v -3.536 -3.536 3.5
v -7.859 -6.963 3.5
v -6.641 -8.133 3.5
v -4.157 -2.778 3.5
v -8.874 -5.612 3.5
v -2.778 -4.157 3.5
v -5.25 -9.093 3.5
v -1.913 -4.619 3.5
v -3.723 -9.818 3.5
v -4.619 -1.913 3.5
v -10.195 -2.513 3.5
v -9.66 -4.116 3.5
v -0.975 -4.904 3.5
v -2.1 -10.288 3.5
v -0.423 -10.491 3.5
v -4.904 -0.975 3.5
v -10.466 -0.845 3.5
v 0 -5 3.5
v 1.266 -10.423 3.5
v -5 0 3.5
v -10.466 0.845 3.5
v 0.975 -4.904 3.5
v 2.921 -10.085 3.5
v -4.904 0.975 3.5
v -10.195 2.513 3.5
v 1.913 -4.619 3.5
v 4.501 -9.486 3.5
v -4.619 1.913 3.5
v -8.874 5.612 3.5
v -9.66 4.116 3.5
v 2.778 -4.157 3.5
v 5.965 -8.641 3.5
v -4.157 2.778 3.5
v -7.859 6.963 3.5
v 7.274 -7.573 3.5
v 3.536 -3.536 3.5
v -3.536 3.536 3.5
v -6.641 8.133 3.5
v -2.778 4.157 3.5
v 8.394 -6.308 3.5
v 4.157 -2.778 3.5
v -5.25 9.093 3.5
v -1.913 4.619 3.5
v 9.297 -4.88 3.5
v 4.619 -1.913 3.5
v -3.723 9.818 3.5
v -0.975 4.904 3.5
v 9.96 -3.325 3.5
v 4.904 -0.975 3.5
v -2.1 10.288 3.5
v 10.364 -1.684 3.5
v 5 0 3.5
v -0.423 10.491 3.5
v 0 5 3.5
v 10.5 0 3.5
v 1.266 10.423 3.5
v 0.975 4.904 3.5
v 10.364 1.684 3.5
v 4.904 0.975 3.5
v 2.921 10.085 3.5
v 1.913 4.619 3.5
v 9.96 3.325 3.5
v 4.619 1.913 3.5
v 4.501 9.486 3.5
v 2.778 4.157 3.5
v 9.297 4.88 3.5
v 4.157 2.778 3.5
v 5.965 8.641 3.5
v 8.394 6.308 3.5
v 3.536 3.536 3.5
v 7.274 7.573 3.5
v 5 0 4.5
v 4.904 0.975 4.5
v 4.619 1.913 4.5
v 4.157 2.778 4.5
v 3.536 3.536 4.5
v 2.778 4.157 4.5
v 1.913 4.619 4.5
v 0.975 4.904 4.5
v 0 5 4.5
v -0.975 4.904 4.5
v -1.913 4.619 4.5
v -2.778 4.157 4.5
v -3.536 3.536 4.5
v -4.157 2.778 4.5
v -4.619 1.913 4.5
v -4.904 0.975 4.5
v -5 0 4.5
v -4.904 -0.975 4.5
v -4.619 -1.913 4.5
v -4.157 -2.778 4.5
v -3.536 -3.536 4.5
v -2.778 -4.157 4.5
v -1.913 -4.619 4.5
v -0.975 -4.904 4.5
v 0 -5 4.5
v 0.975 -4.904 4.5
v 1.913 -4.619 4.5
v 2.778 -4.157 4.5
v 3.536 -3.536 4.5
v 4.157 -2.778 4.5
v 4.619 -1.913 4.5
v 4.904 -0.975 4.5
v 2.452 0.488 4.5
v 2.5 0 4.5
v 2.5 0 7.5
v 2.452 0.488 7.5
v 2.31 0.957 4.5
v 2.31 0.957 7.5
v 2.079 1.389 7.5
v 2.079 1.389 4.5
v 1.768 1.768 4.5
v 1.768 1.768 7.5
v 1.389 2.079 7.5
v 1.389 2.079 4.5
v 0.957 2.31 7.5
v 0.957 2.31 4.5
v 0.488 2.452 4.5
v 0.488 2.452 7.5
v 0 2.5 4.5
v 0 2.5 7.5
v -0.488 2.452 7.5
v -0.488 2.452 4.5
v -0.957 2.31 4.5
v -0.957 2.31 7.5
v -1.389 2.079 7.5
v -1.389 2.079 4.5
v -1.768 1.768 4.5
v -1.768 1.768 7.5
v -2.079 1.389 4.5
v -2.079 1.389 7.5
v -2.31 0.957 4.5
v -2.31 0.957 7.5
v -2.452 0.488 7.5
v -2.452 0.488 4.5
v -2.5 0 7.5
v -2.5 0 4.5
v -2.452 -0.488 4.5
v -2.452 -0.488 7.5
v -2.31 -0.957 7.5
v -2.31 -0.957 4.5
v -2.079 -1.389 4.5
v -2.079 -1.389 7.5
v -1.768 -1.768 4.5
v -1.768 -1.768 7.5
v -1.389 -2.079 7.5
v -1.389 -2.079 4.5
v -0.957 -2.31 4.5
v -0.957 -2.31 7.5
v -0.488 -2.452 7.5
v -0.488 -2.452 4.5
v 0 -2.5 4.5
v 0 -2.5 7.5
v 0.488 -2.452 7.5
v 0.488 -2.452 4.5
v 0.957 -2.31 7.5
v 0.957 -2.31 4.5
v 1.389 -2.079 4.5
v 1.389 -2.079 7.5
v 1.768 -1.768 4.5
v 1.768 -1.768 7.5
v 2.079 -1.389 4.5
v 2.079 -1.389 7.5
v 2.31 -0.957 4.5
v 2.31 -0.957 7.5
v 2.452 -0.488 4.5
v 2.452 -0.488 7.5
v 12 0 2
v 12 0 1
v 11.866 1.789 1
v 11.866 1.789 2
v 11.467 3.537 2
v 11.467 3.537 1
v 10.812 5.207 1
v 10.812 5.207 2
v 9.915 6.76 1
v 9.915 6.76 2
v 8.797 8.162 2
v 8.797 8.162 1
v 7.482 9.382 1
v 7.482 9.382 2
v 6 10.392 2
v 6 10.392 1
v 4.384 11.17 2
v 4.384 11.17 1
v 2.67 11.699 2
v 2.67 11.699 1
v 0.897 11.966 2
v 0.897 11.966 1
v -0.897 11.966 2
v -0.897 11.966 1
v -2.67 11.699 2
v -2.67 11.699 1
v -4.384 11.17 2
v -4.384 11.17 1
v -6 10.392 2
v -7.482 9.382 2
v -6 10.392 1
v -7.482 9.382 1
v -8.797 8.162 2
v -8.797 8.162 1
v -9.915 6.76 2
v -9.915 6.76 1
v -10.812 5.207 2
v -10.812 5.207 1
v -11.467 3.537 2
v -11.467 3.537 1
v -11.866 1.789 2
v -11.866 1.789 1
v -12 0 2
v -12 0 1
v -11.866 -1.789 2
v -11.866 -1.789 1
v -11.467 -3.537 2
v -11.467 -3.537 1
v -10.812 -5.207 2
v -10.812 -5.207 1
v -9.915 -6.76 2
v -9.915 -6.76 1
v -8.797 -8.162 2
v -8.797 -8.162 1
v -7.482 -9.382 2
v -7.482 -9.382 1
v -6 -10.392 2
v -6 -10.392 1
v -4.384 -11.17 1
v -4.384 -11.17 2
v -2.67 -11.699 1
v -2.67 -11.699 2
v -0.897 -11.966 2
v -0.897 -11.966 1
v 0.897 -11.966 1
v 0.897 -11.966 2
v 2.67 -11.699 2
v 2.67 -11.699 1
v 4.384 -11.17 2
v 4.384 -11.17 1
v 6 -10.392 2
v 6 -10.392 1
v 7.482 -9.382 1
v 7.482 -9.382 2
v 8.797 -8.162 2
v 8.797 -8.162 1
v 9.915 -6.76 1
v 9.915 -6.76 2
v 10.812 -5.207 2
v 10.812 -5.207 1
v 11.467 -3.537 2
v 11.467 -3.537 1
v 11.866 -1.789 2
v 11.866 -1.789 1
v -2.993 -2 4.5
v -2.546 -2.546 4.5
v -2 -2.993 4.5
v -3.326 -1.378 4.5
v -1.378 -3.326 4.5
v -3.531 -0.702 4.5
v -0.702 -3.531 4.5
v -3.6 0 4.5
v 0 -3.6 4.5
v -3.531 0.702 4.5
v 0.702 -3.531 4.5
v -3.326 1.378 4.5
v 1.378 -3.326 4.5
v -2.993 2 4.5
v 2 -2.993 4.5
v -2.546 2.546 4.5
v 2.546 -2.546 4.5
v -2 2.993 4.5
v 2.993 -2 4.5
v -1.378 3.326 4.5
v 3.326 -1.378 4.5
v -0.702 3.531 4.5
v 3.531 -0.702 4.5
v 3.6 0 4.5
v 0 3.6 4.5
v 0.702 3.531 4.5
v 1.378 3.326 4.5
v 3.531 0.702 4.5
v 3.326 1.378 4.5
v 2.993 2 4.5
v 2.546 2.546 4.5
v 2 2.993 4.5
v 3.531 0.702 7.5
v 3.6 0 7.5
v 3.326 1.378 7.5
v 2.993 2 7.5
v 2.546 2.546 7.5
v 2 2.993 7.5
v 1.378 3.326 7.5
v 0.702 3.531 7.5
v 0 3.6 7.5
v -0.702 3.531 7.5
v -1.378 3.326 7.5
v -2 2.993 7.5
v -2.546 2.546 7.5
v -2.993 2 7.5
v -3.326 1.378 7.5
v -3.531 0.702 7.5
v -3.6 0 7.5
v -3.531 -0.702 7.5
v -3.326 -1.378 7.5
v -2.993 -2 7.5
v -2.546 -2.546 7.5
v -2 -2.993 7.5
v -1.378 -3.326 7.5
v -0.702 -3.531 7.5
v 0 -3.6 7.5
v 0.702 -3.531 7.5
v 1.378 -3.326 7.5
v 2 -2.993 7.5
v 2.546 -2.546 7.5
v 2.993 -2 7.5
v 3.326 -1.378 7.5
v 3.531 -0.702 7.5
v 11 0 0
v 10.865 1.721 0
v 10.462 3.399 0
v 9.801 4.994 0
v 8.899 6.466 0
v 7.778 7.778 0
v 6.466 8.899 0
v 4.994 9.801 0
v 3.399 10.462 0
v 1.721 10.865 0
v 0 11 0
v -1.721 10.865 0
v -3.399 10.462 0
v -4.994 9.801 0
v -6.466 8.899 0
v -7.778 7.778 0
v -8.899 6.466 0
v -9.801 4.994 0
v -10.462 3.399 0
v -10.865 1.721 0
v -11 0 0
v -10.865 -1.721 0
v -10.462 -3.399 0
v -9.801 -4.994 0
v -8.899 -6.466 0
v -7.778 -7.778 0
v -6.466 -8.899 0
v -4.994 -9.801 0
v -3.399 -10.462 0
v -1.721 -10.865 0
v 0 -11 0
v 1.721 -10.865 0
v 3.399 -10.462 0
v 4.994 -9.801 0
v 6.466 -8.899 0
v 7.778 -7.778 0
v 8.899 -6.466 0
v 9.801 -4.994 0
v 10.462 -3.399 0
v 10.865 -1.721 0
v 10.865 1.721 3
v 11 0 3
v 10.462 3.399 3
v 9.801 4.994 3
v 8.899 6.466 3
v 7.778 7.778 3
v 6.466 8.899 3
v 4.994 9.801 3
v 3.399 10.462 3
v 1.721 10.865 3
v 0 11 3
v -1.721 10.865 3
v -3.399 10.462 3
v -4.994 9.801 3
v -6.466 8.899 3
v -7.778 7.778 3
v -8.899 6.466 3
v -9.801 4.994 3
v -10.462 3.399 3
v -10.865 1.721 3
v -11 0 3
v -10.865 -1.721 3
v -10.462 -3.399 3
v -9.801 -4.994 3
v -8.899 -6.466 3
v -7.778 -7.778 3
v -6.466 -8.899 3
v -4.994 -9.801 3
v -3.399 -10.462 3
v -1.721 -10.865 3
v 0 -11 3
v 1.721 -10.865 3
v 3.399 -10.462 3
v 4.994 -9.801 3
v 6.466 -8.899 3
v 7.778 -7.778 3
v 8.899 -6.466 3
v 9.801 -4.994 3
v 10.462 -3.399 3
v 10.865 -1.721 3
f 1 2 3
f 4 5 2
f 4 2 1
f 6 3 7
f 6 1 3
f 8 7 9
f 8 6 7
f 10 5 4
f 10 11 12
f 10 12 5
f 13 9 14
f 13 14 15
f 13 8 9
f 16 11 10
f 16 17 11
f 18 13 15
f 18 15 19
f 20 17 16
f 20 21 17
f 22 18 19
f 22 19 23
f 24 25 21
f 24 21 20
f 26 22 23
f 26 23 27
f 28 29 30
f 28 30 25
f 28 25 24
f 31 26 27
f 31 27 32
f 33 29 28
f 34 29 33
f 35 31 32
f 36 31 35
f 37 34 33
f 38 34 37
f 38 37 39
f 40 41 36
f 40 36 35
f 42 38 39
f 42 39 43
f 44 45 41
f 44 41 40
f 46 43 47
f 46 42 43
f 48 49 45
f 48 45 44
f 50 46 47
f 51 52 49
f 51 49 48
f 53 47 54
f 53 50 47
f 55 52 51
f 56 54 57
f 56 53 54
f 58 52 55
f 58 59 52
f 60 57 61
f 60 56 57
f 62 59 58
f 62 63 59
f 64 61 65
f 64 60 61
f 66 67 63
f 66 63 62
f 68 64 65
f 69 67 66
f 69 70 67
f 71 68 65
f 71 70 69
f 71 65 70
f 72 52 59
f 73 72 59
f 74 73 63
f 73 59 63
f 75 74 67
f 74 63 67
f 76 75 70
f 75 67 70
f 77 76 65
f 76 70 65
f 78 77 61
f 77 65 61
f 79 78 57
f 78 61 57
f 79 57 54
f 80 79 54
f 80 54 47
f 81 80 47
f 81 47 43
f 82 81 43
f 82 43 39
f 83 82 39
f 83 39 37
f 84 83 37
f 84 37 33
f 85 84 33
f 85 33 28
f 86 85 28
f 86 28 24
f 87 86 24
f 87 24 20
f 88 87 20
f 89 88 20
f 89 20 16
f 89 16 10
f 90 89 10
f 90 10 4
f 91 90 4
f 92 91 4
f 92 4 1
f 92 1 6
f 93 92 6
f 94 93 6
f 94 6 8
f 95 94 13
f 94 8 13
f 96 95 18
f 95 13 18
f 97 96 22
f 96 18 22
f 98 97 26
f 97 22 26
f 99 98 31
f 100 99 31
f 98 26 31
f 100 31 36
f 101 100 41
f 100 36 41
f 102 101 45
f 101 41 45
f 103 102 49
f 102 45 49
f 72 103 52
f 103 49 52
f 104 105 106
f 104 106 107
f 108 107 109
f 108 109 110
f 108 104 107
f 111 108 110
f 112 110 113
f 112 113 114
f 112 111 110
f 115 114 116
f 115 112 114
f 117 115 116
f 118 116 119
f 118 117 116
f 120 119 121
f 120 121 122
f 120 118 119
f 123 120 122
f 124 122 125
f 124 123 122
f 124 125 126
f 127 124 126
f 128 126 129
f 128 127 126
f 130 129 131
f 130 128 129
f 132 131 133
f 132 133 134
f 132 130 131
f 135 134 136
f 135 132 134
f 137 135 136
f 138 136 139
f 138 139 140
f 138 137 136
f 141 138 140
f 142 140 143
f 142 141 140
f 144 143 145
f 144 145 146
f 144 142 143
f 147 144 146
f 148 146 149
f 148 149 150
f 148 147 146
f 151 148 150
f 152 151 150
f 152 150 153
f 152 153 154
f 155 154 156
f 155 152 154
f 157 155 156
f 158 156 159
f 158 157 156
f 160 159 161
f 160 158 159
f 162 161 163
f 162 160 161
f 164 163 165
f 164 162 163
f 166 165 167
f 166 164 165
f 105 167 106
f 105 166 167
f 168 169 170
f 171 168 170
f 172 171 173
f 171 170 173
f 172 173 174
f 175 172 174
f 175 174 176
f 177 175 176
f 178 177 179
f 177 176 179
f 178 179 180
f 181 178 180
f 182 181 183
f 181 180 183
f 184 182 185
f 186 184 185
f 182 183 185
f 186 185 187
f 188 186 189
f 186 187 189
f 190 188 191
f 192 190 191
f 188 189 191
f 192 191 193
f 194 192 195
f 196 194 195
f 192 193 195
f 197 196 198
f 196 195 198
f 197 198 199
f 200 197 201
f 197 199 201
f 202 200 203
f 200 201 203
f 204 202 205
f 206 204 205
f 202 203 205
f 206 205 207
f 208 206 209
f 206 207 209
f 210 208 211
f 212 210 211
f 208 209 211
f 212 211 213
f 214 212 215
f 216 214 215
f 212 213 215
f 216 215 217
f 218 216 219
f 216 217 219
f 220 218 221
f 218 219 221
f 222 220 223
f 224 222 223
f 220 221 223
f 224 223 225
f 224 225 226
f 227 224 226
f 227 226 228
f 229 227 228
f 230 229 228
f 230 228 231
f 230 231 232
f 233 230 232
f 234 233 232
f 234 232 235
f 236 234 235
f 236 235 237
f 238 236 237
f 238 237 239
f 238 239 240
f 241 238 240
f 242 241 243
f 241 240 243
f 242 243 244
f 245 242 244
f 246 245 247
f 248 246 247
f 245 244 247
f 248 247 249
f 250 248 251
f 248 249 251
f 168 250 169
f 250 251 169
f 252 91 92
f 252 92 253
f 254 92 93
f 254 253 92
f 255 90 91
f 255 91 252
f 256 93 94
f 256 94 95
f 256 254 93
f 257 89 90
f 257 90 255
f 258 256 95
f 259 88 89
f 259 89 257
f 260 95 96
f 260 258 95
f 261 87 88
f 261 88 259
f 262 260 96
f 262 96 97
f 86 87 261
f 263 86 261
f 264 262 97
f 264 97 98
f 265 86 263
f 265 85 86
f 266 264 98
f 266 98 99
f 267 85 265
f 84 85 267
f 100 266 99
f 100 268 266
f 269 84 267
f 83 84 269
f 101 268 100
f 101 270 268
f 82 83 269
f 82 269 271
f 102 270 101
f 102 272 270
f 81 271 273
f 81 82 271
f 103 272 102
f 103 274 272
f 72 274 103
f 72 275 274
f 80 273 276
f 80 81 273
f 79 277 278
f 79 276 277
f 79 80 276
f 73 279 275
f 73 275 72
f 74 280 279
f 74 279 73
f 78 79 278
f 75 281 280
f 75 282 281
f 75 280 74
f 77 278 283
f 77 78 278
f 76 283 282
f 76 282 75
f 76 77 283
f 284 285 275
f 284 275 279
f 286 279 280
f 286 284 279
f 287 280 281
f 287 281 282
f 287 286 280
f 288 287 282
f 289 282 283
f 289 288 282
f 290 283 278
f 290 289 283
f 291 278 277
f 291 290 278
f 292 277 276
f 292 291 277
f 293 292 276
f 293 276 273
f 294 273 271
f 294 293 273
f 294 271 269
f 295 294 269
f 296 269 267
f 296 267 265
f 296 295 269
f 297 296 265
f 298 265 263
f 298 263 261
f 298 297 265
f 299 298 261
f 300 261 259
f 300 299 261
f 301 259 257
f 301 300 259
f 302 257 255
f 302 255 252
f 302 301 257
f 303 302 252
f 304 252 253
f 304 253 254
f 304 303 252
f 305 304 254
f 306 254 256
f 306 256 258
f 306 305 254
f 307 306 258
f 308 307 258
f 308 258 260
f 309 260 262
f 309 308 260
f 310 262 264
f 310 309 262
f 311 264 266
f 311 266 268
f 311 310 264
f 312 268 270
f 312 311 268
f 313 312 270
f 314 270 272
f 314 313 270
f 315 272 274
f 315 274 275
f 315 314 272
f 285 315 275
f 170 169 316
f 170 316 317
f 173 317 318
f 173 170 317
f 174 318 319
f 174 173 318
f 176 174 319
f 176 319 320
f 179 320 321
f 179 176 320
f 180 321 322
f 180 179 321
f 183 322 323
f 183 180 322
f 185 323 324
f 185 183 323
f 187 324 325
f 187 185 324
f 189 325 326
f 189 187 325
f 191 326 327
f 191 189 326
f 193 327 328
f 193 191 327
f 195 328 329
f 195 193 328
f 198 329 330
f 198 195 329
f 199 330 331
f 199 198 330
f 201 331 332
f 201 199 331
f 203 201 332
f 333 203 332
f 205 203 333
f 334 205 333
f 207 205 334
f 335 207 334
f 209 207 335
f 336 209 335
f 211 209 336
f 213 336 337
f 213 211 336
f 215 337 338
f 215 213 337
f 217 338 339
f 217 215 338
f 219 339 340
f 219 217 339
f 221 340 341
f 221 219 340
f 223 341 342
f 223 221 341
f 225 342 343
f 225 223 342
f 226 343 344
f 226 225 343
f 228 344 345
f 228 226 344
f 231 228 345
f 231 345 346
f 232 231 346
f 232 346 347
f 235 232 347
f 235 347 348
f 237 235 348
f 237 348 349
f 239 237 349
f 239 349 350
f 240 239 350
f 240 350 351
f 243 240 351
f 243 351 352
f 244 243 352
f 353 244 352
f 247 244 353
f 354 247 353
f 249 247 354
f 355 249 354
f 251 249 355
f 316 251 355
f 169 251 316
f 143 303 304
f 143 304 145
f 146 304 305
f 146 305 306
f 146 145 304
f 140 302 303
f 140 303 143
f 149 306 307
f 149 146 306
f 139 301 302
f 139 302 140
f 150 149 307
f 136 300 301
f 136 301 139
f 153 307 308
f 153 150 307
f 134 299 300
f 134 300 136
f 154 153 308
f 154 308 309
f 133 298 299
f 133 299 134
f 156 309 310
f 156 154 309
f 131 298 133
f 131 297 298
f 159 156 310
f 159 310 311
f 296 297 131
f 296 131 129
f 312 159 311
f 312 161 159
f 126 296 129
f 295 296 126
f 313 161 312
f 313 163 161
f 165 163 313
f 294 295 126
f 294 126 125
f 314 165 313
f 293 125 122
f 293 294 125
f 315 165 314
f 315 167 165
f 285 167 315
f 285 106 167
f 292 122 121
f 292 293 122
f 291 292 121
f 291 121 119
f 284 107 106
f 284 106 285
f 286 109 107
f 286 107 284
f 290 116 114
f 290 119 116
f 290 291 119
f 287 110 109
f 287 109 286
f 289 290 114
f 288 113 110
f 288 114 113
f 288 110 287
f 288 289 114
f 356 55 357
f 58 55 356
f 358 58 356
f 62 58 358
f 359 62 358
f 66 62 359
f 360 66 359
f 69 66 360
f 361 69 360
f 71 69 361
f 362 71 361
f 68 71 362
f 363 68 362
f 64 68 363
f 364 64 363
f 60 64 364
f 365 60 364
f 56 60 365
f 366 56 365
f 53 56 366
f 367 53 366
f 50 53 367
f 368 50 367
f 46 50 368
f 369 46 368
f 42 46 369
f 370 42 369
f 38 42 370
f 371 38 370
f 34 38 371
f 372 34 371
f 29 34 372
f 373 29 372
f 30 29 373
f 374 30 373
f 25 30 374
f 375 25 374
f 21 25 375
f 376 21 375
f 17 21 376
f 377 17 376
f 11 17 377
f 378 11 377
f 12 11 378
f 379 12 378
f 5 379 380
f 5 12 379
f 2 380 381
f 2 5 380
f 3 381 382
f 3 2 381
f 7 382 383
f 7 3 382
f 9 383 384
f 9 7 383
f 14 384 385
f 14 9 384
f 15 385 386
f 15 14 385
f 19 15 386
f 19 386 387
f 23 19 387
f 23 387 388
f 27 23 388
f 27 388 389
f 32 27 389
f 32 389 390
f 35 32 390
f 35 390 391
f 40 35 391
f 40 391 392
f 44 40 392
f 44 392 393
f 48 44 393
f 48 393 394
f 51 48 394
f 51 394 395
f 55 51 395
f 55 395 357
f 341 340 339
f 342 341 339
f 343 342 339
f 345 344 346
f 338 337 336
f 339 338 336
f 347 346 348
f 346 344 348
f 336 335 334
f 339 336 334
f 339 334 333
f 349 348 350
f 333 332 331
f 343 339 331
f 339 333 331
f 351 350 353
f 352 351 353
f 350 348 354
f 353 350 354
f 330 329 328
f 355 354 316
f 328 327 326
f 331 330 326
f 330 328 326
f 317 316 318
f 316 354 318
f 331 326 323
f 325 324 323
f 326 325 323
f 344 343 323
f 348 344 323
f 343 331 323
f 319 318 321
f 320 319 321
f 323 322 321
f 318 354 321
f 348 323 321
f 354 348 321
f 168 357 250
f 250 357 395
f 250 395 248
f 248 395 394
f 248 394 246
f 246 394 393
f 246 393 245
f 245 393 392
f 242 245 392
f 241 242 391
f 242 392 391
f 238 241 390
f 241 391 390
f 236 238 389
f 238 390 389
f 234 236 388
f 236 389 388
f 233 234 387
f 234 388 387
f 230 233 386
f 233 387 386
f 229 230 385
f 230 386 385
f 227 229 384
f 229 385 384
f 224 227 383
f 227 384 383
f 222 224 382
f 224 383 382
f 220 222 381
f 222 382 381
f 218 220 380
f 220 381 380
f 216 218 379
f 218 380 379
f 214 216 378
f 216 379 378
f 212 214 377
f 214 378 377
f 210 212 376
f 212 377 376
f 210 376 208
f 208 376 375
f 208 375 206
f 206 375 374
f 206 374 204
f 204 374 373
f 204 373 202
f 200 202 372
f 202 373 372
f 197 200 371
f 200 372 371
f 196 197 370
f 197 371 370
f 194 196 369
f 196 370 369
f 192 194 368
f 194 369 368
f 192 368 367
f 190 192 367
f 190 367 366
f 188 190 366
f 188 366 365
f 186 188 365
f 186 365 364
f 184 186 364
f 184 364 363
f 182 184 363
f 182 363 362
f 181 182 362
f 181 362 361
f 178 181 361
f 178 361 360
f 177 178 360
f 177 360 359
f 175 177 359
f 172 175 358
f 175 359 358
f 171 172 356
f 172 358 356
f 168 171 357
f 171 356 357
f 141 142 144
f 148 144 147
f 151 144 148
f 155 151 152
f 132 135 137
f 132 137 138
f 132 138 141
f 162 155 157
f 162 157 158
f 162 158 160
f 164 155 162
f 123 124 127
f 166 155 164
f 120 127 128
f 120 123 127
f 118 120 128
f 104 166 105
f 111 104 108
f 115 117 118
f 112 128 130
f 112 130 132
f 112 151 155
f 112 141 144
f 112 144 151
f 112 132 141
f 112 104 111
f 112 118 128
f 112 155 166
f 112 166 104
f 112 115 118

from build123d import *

# Parameters (mm, degrees)
F0_R      = 12
F0_R_2    = 11
F0_R_3    = 5
F0_R_4    = 4.1
F0_R_5    = 3
F1_DEPTH  = 2
F2_DEPTH  = 3.5
F3_SIZE   = 0.99999
F4_DEPTH  = 4.5
F5_DEPTH  = 7.5
F6_SIZE   = 1
F7_SIZE   = 0.5
F8_R      = 3
F8_R_2    = 2.5
F9_DEPTH  = 3
F10_R     = 4.1
F10_R_2   = 3.6
F11_DEPTH = 3


# Not quite as in the source:
# - a fillet or chamfer is up to 0.001 mm smaller than in the source, because OpenCascade refuses the exact size


with BuildPart() as f1:
    # F0 (on Top) → F1 (new body)
    with BuildSketch(Plane.XY):
        Circle(F0_R)
        Circle(F0_R_2, mode=Mode.SUBTRACT)
        Circle(F0_R_2)
        Circle(F0_R_3, mode=Mode.SUBTRACT)
        Circle(F0_R_3)
        Circle(F0_R_4, mode=Mode.SUBTRACT)
        Circle(F0_R_4)
        Circle(F0_R_5, mode=Mode.SUBTRACT)
        Circle(F0_R_5)
    extrude(amount=F1_DEPTH)

    # F0 (on Top) → F2 (join)
    with BuildSketch(Plane.XY):
        Circle(F0_R_2)
        Circle(F0_R_3, mode=Mode.SUBTRACT)
        Circle(F0_R_3)
        Circle(F0_R_4, mode=Mode.SUBTRACT)
        Circle(F0_R_4)
        Circle(F0_R_5, mode=Mode.SUBTRACT)
        Circle(F0_R_5)
    extrude(amount=F2_DEPTH)

    # F3 (size 1 in the source; OpenCascade refuses exactly that, so slightly less here)
    f3_edges = [f1.edges().sort_by_distance(p)[0] for p in [
        (-11, 0, 2),
    ]]
    chamfer(f3_edges, length=F3_SIZE)

    # F0 (on Top) → F4 (join)
    with BuildSketch(Plane.XY):
        Circle(F0_R_3)
        Circle(F0_R_4, mode=Mode.SUBTRACT)
        Circle(F0_R_4)
        Circle(F0_R_5, mode=Mode.SUBTRACT)
        Circle(F0_R_5)
    extrude(amount=F4_DEPTH)

    # F0 (on Top) → F5 (join)
    with BuildSketch(Plane.XY):
        Circle(F0_R_4)
        Circle(F0_R_5, mode=Mode.SUBTRACT)
    extrude(amount=F5_DEPTH)

    # F6
    f6_edges = [f1.edges().sort_by_distance(p)[0] for p in [
        (-12, 0, 0),
    ]]
    chamfer(f6_edges, length=F6_SIZE)

    # F7
    f7_edges = [f1.edges().sort_by_distance(p)[0] for p in [
        (-11, 0, 3.5),
    ]]
    chamfer(f7_edges, length=F7_SIZE)

    # F8 (on face) → F9 (join, through all)
    with BuildSketch(Plane.XY.offset(4.5)):
        Circle(F8_R)
        Circle(F8_R_2, mode=Mode.SUBTRACT)
    extrude(amount=F9_DEPTH)

    # F10 (on face) → F11 (cut, through all)
    with BuildSketch(Plane.XY.offset(7.5)):
        Circle(F10_R)
        Circle(F10_R_2, mode=Mode.SUBTRACT)
    extrude(amount=-F11_DEPTH, mode=Mode.SUBTRACT)


solid = f1.part
